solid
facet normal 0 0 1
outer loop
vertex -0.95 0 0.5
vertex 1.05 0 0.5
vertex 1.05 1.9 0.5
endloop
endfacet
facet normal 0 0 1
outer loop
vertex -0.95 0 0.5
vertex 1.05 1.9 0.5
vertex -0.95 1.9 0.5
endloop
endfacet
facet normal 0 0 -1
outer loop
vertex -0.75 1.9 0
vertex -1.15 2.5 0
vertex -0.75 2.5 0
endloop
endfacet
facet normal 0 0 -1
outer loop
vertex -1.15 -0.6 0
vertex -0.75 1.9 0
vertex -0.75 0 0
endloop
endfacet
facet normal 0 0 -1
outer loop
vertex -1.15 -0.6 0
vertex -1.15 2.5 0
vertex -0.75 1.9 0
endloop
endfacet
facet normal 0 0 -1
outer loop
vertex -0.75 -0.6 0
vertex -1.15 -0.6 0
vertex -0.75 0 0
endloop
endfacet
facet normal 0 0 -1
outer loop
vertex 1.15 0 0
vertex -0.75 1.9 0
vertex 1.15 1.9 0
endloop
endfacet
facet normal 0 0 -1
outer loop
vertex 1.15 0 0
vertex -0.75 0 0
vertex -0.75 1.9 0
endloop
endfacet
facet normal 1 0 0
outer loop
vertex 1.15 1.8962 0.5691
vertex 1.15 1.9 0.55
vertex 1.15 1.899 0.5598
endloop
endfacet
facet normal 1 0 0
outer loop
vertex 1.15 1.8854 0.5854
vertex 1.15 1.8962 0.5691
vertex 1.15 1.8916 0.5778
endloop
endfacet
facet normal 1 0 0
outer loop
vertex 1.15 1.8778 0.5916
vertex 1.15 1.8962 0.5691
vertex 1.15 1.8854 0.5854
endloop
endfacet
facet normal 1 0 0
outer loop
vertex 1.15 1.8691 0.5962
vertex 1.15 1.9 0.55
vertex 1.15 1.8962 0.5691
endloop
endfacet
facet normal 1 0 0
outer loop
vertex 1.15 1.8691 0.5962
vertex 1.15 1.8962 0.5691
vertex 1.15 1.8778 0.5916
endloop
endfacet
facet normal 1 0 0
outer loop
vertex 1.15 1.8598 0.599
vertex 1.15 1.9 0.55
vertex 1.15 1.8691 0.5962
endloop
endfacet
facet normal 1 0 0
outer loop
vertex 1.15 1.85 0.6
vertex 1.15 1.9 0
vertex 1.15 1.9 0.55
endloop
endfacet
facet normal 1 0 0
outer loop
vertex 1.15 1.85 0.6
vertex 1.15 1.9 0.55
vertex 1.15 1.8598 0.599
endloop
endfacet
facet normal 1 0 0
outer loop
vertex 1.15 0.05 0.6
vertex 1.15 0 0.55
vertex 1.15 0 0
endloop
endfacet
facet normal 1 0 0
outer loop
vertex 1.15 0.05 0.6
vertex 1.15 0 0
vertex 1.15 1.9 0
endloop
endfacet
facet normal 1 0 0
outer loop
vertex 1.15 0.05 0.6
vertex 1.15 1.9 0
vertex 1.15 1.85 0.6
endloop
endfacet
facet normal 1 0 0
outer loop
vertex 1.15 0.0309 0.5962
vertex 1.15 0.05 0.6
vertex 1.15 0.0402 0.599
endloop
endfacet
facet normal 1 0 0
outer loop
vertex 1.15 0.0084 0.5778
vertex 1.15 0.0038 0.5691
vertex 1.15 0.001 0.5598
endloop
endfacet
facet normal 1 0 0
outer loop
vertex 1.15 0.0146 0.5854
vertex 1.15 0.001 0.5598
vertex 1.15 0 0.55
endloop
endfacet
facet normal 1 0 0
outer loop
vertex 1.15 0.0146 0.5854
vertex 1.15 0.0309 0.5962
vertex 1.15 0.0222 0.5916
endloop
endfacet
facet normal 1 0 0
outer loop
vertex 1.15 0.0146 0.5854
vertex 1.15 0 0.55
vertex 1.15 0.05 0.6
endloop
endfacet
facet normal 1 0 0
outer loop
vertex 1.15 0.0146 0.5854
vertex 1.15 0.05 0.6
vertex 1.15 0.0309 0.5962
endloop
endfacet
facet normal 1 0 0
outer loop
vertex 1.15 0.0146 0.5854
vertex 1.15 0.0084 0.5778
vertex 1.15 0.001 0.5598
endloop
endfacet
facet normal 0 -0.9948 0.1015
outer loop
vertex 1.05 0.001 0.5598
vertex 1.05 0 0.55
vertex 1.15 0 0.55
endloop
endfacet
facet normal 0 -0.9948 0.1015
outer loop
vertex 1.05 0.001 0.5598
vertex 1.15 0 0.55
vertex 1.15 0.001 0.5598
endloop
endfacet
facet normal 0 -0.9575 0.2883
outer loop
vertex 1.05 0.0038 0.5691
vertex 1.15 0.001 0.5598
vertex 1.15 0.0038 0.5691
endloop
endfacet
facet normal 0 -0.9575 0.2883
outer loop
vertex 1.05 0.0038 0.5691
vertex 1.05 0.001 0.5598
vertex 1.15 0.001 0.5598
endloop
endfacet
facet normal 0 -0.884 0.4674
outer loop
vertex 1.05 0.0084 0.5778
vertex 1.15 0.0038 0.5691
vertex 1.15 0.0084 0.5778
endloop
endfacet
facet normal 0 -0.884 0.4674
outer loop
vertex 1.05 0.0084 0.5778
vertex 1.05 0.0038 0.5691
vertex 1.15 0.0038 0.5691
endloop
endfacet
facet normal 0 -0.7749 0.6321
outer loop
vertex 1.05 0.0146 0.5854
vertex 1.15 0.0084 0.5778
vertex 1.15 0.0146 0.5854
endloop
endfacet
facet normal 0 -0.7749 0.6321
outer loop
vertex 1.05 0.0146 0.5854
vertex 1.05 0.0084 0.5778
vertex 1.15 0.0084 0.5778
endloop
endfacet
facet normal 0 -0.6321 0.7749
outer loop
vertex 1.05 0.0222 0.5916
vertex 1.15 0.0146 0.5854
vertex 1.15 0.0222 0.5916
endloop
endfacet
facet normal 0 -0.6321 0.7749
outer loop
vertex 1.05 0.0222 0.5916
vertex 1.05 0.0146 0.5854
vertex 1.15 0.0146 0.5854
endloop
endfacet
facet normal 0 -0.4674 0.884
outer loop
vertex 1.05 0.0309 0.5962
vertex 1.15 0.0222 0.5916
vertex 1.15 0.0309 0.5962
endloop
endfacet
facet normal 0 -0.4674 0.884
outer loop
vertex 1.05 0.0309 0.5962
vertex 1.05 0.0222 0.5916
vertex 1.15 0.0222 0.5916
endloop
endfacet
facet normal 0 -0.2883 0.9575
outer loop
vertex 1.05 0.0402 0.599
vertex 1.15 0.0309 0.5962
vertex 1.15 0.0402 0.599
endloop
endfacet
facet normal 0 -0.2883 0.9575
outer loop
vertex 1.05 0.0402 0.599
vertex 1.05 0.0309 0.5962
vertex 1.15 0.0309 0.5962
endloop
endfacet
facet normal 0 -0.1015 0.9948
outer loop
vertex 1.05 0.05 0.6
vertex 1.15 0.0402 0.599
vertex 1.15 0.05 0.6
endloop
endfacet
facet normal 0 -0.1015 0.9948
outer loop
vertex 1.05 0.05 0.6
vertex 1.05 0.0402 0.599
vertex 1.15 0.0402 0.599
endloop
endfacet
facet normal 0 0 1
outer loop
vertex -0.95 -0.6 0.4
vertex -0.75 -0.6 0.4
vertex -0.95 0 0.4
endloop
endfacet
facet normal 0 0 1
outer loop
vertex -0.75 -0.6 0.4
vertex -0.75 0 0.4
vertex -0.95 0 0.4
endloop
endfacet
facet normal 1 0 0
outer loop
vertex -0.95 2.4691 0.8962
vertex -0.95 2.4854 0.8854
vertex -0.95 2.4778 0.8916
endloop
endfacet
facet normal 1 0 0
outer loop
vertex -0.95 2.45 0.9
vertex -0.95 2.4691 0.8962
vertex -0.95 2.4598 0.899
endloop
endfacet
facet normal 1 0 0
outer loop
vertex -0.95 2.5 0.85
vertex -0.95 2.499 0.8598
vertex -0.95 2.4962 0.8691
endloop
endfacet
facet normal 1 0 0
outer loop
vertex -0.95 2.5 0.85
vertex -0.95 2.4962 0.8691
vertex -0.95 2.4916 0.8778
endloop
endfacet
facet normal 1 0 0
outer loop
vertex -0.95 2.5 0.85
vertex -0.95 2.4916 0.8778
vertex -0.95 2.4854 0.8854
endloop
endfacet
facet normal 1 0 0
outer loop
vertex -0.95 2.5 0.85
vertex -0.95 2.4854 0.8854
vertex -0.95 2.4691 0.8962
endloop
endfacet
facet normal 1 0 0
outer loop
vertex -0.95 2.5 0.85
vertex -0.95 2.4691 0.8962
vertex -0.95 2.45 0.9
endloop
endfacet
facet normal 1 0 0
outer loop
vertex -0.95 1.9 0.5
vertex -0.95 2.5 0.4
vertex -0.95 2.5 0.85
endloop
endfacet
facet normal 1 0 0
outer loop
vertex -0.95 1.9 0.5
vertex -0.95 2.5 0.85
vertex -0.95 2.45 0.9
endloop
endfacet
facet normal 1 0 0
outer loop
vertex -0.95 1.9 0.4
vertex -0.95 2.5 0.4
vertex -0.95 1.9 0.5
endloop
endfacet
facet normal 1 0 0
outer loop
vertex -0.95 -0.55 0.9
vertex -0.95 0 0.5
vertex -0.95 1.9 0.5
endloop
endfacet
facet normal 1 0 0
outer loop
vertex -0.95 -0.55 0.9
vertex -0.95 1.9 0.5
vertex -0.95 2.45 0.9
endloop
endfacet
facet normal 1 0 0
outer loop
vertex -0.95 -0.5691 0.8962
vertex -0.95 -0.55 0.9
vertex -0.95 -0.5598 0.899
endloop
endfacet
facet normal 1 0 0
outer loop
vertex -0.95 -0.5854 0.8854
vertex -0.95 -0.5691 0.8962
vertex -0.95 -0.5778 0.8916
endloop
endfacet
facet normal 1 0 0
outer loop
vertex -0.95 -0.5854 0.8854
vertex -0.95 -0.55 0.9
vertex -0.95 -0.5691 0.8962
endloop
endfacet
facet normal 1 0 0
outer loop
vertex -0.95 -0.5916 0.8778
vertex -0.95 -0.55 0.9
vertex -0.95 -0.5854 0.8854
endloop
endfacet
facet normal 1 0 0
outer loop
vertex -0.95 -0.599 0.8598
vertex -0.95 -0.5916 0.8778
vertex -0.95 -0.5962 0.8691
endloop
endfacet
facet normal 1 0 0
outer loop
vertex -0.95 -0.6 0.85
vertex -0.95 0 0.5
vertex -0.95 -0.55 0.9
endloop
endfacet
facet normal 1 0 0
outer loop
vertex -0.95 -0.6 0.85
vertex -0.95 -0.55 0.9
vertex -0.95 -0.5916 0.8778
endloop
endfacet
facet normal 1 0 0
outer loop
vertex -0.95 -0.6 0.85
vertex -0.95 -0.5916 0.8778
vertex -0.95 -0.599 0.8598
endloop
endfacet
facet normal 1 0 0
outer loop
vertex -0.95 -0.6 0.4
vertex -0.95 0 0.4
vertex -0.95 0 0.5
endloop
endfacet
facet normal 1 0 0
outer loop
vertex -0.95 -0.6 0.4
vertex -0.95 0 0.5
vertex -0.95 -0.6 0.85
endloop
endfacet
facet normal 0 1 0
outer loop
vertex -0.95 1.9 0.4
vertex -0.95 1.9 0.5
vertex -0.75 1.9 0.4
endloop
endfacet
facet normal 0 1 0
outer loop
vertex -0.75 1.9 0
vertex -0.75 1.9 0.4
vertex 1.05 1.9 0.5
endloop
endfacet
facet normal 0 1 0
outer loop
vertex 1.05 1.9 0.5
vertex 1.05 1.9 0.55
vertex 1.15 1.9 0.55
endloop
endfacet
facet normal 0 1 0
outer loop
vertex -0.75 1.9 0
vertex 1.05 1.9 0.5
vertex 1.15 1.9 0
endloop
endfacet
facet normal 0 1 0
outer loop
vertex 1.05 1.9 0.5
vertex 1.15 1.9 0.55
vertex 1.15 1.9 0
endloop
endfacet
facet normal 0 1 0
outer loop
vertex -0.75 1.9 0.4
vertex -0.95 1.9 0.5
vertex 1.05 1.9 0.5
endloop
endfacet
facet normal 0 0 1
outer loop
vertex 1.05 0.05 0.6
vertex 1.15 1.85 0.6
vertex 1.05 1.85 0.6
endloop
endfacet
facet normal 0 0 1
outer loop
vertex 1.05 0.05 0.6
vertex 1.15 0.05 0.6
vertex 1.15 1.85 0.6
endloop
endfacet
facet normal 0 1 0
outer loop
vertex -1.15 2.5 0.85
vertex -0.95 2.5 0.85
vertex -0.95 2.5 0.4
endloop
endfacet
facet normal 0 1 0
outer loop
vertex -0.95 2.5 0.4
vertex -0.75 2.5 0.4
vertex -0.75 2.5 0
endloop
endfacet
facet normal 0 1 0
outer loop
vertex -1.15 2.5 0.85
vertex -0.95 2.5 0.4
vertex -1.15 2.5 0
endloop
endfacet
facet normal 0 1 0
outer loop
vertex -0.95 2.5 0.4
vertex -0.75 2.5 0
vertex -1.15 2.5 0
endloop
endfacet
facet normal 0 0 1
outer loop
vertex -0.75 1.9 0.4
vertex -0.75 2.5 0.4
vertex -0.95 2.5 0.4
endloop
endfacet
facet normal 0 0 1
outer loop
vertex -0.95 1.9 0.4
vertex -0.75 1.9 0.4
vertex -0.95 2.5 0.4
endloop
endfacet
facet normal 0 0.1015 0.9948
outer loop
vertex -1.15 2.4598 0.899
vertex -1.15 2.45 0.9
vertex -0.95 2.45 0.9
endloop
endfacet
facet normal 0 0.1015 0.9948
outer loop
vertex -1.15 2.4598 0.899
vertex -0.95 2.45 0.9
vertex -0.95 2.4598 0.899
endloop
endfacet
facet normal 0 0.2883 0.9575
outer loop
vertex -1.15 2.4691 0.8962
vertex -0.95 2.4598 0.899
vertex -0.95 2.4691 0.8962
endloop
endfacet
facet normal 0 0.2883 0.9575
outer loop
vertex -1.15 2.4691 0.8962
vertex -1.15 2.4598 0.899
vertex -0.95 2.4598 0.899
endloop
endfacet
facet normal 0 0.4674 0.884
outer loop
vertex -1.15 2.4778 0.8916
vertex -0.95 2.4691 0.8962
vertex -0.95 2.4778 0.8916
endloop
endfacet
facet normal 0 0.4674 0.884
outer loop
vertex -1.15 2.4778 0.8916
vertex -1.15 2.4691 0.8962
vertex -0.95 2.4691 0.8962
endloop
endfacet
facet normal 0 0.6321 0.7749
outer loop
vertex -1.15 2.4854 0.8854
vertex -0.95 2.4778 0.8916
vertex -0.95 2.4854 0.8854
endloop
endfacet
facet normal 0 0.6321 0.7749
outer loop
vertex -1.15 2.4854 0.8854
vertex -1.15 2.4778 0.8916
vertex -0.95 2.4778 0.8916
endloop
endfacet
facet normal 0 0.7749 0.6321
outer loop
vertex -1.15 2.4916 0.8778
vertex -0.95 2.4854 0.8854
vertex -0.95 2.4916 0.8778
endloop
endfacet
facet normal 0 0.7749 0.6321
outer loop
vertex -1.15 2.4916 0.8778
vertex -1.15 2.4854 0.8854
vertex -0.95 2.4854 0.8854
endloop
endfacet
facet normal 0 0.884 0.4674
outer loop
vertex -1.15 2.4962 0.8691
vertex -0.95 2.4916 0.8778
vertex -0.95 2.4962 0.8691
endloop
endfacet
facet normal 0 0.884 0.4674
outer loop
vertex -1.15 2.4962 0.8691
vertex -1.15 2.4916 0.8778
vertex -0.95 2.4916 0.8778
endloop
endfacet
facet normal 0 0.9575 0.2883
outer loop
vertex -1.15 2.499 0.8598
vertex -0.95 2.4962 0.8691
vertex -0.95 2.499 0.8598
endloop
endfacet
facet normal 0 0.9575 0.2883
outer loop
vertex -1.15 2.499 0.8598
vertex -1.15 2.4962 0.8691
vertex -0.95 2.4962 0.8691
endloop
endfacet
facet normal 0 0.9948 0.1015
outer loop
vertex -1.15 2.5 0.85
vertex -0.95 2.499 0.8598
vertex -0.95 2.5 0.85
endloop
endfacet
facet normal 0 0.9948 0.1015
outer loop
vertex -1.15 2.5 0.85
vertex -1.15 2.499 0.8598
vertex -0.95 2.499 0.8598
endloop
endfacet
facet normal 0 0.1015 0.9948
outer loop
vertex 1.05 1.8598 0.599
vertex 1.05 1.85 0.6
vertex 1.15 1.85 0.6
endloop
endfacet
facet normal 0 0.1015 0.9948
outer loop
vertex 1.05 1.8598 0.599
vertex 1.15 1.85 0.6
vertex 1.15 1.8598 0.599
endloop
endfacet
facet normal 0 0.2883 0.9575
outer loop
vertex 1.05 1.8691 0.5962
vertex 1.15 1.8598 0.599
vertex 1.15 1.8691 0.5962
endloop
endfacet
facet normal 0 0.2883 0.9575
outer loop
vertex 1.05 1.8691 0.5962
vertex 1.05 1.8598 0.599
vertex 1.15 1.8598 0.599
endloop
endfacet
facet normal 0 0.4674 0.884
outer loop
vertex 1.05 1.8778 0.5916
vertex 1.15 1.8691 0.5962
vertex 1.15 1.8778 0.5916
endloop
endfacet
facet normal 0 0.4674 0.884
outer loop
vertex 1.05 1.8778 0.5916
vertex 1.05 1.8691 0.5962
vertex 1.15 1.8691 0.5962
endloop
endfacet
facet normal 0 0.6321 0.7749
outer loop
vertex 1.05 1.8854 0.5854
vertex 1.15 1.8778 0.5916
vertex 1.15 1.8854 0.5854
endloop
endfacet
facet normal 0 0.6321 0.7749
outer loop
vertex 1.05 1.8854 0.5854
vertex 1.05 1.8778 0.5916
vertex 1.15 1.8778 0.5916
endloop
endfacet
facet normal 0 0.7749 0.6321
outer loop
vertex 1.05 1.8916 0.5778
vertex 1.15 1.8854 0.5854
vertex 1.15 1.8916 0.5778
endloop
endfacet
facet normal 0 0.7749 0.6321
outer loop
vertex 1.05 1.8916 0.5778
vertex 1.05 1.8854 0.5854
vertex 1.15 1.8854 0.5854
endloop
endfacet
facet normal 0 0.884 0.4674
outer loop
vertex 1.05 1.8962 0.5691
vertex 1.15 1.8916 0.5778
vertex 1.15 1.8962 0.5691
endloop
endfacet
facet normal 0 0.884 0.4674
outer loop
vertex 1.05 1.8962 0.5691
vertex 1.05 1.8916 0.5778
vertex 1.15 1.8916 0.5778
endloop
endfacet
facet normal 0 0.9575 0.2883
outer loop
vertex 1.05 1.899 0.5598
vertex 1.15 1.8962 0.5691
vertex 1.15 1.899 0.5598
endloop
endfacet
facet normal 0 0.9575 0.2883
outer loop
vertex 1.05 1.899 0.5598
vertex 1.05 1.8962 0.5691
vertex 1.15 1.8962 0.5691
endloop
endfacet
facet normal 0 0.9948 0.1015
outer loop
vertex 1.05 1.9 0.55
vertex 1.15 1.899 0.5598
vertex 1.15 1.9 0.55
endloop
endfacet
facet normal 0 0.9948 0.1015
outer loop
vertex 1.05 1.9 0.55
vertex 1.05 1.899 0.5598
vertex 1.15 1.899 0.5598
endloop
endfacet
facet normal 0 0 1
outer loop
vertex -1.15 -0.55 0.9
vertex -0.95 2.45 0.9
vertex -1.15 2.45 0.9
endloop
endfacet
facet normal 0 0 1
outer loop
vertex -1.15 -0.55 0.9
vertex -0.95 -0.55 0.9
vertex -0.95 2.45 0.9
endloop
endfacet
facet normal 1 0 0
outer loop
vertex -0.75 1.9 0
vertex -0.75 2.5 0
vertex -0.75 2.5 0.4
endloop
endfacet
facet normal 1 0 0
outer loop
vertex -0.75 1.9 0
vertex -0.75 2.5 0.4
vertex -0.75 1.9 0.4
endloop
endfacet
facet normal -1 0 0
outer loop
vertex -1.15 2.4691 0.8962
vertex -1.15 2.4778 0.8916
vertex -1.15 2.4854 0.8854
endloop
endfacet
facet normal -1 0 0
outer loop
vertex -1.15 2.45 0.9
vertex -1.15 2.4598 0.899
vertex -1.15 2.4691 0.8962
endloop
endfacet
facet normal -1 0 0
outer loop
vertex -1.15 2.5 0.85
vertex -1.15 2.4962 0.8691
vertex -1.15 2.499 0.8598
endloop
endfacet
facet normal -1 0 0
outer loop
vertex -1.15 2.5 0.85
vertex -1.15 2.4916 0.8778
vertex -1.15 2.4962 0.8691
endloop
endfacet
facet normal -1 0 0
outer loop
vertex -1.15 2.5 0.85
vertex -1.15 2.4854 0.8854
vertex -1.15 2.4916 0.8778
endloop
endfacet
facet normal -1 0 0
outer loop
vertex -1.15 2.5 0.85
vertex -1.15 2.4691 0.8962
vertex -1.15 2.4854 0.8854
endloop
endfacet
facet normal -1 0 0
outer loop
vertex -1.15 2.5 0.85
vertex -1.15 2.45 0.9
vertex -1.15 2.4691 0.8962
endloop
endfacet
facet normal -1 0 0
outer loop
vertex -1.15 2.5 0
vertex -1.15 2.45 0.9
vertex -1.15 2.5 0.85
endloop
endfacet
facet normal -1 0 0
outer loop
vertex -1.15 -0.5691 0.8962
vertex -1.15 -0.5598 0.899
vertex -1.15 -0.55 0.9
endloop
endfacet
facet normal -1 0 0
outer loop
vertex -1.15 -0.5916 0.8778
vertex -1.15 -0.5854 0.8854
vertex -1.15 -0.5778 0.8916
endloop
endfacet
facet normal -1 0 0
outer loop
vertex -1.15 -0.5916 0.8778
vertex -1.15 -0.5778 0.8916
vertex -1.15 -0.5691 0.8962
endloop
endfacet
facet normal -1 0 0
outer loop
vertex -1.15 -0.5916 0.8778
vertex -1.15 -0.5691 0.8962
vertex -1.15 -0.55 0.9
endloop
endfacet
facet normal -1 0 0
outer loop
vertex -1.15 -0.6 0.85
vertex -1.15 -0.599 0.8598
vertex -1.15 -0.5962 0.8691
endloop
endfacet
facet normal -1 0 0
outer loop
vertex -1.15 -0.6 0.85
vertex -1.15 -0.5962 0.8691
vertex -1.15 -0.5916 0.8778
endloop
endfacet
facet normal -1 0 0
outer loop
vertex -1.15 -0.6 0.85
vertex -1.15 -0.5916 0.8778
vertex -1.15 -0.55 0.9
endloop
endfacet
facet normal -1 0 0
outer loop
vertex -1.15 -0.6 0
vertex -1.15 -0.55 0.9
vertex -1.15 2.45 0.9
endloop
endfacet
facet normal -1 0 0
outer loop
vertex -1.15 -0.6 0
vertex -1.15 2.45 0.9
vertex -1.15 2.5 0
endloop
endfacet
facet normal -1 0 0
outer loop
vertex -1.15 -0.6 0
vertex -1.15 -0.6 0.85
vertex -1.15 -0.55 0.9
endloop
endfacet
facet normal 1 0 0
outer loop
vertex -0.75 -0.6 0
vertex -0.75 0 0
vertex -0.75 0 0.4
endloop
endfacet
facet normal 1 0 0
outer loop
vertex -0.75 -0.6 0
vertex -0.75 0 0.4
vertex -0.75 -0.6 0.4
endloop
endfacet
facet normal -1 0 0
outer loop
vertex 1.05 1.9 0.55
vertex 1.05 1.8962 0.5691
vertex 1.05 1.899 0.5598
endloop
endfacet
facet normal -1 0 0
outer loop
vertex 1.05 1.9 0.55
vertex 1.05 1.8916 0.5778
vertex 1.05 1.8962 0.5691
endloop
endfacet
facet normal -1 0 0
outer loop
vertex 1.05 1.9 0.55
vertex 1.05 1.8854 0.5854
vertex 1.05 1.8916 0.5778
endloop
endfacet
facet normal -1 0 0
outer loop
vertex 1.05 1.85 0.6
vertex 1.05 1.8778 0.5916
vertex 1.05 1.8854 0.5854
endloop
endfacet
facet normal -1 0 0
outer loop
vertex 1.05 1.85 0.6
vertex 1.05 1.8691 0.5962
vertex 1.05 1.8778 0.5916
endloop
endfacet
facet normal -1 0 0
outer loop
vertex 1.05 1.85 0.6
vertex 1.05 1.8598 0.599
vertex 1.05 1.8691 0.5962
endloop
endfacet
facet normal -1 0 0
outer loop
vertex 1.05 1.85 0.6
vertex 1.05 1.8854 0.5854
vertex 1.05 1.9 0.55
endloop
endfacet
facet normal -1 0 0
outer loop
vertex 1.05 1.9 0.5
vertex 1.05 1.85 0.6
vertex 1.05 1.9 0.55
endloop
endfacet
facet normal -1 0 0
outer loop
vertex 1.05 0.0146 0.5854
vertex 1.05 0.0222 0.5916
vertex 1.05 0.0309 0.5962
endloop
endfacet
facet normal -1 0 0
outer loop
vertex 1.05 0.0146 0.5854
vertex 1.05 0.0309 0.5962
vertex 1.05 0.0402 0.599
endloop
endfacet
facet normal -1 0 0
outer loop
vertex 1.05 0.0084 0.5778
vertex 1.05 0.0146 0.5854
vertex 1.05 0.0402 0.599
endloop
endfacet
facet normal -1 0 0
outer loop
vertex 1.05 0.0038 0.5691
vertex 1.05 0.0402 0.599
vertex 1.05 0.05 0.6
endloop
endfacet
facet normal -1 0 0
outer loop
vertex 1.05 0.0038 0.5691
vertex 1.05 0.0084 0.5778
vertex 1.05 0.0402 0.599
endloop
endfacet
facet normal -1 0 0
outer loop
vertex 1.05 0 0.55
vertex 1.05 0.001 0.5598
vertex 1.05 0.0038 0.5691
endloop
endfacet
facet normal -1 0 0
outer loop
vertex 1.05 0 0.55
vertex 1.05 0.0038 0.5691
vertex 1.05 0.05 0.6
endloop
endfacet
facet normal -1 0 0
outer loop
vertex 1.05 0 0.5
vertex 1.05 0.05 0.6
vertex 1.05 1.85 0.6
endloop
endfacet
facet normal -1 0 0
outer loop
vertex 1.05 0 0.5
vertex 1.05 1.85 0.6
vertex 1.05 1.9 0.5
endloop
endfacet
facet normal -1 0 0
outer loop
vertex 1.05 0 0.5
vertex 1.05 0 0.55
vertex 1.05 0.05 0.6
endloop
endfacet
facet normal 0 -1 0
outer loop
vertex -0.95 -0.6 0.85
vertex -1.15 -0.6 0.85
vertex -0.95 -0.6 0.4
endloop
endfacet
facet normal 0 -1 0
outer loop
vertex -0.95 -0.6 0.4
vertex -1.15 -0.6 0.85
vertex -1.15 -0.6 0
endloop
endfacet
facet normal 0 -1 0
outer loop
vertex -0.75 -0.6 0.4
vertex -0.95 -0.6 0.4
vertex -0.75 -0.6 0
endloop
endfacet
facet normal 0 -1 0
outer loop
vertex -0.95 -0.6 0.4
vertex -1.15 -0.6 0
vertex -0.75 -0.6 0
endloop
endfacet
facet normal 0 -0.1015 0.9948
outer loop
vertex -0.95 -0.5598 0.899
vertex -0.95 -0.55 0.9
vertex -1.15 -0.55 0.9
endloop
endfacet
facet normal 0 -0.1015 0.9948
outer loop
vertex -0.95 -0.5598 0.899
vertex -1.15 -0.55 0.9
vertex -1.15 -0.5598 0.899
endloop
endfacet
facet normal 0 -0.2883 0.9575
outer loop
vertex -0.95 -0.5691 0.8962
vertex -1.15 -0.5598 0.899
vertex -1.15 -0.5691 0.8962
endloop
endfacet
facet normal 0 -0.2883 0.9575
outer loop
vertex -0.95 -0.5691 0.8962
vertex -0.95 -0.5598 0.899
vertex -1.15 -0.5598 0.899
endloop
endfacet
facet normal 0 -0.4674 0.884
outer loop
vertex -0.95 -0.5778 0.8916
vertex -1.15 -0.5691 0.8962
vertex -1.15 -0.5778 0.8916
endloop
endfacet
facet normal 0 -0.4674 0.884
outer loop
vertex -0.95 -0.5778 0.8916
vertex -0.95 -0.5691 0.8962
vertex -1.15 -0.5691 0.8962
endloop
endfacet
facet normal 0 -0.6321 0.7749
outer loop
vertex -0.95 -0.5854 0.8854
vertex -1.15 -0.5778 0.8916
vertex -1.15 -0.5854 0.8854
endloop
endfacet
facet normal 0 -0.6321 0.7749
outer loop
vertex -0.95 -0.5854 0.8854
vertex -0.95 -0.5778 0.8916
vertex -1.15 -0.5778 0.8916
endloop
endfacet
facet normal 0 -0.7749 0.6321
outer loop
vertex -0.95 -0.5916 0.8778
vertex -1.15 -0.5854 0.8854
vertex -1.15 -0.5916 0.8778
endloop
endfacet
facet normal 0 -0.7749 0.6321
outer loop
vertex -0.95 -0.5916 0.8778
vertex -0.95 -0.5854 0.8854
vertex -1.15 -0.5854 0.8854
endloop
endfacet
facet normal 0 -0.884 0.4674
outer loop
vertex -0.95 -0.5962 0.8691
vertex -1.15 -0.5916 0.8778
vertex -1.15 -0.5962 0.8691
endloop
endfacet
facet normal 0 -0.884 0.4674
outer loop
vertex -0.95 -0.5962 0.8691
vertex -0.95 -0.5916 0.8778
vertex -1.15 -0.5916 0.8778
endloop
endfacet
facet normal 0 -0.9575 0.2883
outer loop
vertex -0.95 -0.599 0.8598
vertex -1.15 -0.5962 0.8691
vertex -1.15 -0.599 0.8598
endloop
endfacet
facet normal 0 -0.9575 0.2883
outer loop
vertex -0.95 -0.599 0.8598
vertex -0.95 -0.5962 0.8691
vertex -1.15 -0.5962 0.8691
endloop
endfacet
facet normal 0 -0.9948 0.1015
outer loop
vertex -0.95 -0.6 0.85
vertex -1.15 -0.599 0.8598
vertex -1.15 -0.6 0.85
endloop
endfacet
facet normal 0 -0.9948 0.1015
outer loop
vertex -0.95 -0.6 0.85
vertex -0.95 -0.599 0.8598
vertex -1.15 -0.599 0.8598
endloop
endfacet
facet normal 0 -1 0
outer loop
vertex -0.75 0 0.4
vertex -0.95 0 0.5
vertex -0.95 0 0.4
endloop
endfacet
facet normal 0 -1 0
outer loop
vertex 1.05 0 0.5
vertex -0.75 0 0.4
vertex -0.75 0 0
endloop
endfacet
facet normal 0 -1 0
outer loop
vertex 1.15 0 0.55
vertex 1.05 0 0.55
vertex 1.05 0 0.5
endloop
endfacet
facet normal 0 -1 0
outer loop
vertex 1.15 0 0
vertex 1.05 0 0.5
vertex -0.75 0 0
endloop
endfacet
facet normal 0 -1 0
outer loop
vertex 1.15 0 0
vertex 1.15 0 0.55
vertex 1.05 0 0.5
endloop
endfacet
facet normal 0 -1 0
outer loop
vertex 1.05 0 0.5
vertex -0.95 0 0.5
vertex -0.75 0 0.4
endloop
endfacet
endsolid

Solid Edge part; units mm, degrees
sketch "Sketch1" plane through (0, 0, 0) normal (0, -1, 0) x (1, 0, 0)
  line L0 (-1.15, 0) -> (1.15, 0)
  line L1 (1.15, 0) -> (1.15, 0.6)
  line L2 (1.15, 0.6) -> (1.05, 0.6)
  line L3 (1.05, 0.6) -> (1.05, 0.5)
  line L4 (1.05, 0.5) -> (-0.95, 0.5)
  line L5 (-0.95, 0.5) -> (-0.95, 0.9)
  line L6 (-0.95, 0.9) -> (-1.15, 0.9)
  line L7 (-1.15, 0.9) -> (-1.15, 0)
  dimension "D1" = 0.2
  dimension "D2" = 0.1
  dimension "D3" = 2.3
  dimension "D4" = 0.5
  dimension "D5" = 0.6
  dimension "D6" = 0.9
extrude "Protrusion1" add sketch "Sketch1" against normal blind 1.9
sketch "Sketch2" plane through (0, 0.95, 0) normal (0, 0, -1) x (-1, 0, 0)
  line L0 (1.15, -1.55) -> (0.95, -1.55)
  line L1 (0.95, -0.95) -> (0.95, -1.55)
  line L2 (1.15, -0.95) -> (0.95, -0.95)
  line L3 (1.15, -0.95) -> (1.15, -1.55)
  line L4 (0.95, 1.55) -> (0.95, 0.95)
  line L5 (1.15, 0.95) -> (0.95, 0.95)
  line L6 (1.15, 1.55) -> (1.15, 0.95)
  line L7 (0.95, 1.55) -> (1.15, 1.55)
  dimension "D1" = 0.6
extrude "Protrusion2" add sketch "Sketch2" against normal up to surface (0.9 mm away)
sketch "Sketch3" plane through (0, 0.95, 0) normal (0, 0, -1) x (-1, 0, 0)
  line L0 (0.95, -0.95) -> (0.75, -0.95)
  line L1 (0.75, -0.95) -> (0.75, -1.55)
  line L2 (0.75, -1.55) -> (0.95, -1.55)
  line L3 (0.95, -0.95) -> (0.95, -1.55)
  line L4 (0.95, 0.95) -> (0.95, 1.55)
  line L5 (0.75, 1.55) -> (0.95, 1.55)
  line L6 (0.75, 1.55) -> (0.75, 0.95)
  line L7 (0.95, 0.95) -> (0.75, 0.95)
extrude "Ausprägung_3" add sketch "Sketch3" against normal blind 0.4
fillet "Verrundung_1" radius 0.05 4 edges at (-1.05, -0.6, 0.9) (-1.05, 2.5, 0.9) (1.1, 1.9, 0.6) (1.1, 0, 0.6)
